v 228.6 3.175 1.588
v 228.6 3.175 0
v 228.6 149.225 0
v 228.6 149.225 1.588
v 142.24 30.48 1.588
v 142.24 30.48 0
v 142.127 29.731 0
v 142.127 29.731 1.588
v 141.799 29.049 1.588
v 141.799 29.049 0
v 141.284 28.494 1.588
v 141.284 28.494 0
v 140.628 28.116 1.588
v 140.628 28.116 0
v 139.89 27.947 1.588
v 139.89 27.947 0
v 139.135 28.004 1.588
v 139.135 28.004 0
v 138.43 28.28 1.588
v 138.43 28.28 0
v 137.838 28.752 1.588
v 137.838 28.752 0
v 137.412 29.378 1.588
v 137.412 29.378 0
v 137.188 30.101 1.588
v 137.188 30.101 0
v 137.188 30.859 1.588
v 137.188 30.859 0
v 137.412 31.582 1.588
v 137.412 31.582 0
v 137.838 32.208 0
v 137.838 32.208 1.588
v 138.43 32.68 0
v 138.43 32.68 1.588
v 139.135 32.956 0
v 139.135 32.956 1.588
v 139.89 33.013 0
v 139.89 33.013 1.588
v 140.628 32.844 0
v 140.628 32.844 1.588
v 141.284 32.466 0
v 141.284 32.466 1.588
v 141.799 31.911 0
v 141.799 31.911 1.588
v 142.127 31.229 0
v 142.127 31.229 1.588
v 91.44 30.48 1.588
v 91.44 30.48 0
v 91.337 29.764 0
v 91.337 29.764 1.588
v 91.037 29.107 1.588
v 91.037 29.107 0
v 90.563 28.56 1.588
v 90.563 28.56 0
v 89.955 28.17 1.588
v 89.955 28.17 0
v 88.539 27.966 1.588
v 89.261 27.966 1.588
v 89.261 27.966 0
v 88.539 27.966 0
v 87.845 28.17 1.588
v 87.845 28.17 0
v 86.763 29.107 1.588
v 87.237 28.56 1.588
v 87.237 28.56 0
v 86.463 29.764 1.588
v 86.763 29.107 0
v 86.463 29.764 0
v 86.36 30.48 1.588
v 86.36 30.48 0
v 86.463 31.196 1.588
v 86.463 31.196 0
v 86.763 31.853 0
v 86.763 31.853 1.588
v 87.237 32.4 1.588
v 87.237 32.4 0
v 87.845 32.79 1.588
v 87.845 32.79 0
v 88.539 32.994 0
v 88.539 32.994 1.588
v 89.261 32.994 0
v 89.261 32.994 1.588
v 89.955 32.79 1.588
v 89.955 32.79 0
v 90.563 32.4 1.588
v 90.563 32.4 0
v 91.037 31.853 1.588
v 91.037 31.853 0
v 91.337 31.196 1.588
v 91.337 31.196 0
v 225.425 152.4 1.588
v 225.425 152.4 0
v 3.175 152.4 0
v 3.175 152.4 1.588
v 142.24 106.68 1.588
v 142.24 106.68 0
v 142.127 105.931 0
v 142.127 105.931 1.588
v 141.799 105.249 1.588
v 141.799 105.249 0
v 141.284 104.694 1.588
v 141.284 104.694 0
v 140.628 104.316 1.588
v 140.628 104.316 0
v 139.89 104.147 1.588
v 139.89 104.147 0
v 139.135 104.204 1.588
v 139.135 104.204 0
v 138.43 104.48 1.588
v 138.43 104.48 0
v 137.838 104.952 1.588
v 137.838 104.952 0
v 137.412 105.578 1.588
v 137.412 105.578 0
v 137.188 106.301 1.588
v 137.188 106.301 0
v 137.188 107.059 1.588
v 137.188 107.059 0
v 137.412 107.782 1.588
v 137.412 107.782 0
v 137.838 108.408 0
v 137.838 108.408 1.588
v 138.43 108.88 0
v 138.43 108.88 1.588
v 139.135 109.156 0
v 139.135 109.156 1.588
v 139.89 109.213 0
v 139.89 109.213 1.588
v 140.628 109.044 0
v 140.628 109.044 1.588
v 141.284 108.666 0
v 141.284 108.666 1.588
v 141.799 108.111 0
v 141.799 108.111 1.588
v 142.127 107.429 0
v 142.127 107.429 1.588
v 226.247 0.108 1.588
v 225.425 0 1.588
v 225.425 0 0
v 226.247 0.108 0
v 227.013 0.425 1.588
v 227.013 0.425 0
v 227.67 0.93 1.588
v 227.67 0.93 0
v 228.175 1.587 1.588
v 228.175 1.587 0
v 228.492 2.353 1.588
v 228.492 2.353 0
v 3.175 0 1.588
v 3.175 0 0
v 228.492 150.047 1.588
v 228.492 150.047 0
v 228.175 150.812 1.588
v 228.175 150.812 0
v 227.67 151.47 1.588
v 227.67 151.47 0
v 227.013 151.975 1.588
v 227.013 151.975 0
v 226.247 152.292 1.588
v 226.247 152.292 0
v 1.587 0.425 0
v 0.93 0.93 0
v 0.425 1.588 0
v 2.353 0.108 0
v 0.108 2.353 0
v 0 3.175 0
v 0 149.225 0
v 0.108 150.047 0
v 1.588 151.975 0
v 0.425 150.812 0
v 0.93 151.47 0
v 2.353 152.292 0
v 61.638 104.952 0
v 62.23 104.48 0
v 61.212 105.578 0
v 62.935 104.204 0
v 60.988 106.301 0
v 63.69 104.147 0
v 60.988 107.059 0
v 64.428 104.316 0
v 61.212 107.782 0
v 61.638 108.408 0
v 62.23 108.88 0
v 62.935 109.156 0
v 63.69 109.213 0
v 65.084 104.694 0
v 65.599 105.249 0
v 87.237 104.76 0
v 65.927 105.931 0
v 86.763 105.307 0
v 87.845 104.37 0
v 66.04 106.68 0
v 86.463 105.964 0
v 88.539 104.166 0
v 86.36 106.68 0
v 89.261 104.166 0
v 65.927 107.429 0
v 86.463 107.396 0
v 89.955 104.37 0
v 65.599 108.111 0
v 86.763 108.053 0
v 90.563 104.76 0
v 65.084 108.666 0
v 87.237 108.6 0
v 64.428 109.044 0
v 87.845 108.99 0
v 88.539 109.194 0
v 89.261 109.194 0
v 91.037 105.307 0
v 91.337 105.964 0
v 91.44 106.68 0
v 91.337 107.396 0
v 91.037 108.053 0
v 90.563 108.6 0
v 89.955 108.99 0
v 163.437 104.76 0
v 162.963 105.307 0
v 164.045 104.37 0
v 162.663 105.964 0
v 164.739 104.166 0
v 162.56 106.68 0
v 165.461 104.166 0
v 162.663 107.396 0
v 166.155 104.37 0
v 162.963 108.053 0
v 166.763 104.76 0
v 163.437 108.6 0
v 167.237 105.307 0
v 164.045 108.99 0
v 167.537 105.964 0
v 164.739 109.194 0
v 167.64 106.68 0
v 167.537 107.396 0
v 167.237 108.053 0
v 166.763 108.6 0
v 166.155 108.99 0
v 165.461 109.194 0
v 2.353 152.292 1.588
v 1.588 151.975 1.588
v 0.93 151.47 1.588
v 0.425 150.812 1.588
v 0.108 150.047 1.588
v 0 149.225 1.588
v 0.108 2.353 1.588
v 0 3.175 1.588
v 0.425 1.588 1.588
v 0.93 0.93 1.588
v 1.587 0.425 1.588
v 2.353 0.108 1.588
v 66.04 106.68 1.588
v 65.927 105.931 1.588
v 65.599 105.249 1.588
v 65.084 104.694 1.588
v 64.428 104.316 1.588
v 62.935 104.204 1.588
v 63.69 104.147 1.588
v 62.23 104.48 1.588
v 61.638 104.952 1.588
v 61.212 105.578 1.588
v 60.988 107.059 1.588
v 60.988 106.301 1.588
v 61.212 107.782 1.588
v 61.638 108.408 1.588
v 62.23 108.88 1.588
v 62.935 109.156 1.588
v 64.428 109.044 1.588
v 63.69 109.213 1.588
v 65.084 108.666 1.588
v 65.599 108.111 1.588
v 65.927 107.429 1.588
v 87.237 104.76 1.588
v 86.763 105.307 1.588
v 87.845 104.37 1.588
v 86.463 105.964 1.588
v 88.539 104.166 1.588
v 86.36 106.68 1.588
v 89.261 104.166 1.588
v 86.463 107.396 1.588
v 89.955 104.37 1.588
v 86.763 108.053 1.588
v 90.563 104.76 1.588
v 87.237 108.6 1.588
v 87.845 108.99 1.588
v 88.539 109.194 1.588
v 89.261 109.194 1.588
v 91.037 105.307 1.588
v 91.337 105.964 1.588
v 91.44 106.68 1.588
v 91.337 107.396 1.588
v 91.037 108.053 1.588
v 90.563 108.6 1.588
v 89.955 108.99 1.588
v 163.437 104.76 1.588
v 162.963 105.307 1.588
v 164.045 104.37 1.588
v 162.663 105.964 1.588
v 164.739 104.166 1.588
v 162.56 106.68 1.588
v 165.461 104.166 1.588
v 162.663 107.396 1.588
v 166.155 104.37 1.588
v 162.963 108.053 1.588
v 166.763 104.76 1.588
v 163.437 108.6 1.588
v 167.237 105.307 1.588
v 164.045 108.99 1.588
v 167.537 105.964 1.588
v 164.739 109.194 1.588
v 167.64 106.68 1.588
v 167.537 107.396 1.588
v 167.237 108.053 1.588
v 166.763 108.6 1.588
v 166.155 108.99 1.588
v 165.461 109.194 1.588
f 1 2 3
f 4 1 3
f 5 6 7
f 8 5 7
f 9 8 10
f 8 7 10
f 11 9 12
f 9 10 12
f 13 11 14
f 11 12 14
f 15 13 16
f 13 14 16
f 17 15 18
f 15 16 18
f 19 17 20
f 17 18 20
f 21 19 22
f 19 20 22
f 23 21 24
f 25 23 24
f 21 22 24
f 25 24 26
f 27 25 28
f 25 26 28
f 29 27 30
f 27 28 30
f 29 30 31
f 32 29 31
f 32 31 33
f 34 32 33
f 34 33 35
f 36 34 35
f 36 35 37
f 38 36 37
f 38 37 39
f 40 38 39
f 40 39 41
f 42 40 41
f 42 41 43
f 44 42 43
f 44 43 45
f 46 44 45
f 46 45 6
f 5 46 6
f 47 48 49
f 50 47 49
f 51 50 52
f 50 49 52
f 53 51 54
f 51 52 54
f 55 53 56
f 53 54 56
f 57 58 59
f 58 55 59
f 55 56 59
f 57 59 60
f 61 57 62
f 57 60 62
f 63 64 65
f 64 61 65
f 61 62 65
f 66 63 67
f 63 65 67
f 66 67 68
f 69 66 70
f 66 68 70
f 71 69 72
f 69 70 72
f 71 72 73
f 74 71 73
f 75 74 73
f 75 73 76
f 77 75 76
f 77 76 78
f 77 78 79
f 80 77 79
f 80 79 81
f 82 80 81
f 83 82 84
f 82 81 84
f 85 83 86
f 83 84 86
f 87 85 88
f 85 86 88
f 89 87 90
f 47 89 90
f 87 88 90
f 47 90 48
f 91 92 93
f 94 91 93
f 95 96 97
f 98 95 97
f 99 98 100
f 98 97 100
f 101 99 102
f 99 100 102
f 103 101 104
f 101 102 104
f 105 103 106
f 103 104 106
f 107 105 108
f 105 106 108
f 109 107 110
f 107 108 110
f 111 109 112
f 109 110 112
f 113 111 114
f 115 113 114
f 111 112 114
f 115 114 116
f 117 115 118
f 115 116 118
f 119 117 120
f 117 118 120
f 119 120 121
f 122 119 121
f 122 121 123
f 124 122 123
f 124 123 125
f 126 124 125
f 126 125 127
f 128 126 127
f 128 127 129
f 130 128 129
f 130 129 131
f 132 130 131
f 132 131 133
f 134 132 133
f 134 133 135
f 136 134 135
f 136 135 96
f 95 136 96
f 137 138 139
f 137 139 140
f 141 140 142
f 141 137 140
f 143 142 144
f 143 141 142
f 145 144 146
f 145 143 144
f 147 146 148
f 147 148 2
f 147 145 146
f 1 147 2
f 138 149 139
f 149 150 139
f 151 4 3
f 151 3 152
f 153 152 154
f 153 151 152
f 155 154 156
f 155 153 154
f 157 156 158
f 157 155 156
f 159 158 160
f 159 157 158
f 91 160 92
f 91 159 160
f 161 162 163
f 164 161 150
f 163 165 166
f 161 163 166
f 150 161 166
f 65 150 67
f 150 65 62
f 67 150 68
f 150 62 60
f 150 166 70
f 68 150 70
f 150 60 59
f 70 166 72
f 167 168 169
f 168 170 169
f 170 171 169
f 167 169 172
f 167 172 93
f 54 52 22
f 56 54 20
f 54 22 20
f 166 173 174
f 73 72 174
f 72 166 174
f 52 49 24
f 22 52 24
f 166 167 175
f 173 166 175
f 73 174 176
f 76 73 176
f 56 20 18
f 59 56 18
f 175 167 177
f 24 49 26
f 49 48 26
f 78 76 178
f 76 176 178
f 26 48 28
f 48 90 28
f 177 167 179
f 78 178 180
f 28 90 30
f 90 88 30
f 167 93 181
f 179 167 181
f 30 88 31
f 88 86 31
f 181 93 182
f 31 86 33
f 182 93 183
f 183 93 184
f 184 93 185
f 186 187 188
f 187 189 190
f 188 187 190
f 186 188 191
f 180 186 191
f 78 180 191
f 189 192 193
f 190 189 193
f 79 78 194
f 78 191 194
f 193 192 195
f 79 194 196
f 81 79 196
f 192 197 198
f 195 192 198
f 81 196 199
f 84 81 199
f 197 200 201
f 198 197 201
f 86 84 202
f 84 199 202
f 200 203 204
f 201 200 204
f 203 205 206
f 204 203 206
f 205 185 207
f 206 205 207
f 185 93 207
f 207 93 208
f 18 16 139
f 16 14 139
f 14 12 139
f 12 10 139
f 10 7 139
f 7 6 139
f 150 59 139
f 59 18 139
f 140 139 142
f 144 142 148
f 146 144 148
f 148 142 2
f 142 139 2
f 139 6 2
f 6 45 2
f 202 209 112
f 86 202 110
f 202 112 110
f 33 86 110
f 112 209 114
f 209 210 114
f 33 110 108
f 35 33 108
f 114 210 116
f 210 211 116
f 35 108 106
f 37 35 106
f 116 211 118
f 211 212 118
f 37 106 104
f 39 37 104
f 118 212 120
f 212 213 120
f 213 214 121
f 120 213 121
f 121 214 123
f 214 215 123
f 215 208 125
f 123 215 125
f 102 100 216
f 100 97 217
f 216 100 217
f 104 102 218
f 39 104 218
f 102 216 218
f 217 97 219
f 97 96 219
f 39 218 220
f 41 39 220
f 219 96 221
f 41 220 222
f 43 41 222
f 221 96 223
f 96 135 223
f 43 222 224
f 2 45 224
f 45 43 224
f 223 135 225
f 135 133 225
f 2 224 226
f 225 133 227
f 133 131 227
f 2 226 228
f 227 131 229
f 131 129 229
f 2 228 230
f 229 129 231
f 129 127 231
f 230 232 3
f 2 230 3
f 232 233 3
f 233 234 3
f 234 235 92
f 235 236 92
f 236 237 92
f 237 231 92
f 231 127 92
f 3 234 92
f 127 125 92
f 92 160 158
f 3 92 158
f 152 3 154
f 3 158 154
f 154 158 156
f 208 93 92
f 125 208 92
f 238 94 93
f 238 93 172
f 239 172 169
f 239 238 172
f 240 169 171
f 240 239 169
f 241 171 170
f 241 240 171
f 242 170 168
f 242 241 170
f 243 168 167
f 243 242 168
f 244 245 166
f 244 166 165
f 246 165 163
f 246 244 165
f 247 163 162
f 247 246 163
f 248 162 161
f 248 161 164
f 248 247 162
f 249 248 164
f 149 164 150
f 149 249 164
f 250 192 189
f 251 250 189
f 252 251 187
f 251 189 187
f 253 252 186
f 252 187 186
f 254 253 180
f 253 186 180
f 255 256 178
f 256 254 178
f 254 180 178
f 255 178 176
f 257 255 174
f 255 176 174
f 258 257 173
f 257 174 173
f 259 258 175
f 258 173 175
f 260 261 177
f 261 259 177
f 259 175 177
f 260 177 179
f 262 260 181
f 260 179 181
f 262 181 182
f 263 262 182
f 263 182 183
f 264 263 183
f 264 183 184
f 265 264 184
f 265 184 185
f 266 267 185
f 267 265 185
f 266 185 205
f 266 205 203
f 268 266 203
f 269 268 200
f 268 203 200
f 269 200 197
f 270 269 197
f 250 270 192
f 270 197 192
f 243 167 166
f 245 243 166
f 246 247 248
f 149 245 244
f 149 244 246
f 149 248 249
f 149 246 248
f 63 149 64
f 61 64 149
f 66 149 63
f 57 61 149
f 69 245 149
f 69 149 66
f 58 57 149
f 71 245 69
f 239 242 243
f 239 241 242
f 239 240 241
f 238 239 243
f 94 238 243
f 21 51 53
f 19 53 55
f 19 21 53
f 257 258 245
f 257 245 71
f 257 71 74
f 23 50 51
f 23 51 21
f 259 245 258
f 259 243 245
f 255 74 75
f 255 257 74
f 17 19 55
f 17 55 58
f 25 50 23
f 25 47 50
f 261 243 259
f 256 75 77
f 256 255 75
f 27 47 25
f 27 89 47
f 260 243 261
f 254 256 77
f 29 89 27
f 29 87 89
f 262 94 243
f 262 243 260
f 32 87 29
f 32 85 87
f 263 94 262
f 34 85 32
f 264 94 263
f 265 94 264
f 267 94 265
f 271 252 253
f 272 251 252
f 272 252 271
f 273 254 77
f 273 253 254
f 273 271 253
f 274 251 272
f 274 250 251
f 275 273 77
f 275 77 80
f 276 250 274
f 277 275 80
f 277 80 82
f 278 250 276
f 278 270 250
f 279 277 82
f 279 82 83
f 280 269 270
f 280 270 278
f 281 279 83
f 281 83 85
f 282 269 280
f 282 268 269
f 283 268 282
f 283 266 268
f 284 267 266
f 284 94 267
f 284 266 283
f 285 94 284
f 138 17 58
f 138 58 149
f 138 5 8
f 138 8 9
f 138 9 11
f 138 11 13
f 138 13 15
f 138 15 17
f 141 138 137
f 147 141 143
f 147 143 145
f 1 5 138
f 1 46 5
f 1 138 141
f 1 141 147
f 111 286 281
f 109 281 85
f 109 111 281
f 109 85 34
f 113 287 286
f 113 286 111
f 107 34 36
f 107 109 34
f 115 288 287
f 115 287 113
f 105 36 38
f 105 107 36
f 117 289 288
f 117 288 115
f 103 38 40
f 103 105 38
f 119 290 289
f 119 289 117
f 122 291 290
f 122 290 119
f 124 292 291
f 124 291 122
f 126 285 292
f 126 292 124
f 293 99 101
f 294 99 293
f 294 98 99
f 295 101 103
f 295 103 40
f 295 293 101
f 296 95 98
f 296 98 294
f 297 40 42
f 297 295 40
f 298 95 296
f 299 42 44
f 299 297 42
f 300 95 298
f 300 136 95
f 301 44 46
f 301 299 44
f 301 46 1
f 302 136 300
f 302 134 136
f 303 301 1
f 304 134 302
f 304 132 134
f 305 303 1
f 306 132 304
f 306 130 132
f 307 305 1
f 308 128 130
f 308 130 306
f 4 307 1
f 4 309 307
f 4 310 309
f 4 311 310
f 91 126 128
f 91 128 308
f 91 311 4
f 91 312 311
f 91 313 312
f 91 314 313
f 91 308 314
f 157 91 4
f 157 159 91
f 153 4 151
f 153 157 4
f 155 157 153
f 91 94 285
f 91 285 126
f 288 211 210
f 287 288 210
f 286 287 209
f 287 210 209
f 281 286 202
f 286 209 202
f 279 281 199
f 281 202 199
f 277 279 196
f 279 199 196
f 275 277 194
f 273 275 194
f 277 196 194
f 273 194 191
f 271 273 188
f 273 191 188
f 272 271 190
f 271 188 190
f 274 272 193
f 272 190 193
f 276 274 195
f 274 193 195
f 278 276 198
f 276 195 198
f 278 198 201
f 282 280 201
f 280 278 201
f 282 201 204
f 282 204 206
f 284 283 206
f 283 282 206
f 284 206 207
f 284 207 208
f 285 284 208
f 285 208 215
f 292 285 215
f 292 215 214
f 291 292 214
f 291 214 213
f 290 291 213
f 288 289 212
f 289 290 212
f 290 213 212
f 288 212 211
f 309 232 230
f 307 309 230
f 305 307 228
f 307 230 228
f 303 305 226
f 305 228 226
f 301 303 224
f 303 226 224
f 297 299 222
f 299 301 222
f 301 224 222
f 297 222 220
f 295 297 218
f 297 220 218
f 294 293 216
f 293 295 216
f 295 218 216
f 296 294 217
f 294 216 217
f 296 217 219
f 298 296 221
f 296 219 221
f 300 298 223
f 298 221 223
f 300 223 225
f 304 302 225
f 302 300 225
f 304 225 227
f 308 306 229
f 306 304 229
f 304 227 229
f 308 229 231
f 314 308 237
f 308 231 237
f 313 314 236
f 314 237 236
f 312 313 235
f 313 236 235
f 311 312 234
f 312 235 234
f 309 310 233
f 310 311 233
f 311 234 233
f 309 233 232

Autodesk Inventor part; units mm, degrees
ref_plane "YZ Plane" through (0, 0, 0) normal (1, 0, 0) x (0, 1, 0)
ref_plane "XZ Plane" through (0, 0, 0) normal (0, 1, 0) x (-1, 0, 0)
ref_plane "XY Plane" through (0, 0, 0) normal (0, 0, 1) x (1, 0, 0)
sketch "Sketch1" plane through (0, 0, 0) normal (0, 0, 1) x (1, 0, 0)
  line L0 (0, 0) -> (228.6, 0)
  line L1 (228.6, 0) -> (228.6, 152.4)
  line L2 (228.6, 152.4) -> (0, 152.4)
  line L3 (0, 152.4) -> (0, 0)
  line L4 (0, 152.4) -> (50.8, 152.4)
  line L5 (50.8, 152.4) -> (50.8, 0)
  line L6 (228.6, 152.4) -> (177.8, 152.4)
  line L7 (177.8, 152.4) -> (177.8, 0)
  line L8 (50.8, 0) -> (50.8, 30.48)
  line L9 (50.8, 30.48) -> (88.9, 30.48)
  circle A0 centre (88.9, 30.48) radius 2.54
  line L10 (88.9, 30.48) -> (139.7, 30.48)
  circle A1 centre (139.7, 30.48) radius 2.54
  line L11 (139.7, 30.48) -> (139.7, 106.68)
  circle A2 centre (139.7, 106.68) radius 2.54
  line L12 (88.9, 30.48) -> (88.9, 106.68)
  circle A3 centre (88.9, 106.68) radius 2.54
  line L13 (88.9, 106.68) -> (139.7, 106.68)
  line L14 (139.7, 106.68) -> (165.1, 106.68)
  circle A4 centre (165.1, 106.68) radius 2.54
  line L15 (88.9, 106.68) -> (63.5, 106.68)
  circle A5 centre (63.5, 106.68) radius 2.54
  dimension "d0" = 228.6
  dimension "d1" = 152.4
  dimension "d2" = 50.8
  dimension "d3" = 50.8
  dimension "d4" = 30.48
  dimension "d5" = 38.1
  dimension "d6" = 5.08
  dimension "d7" = 50.8
  dimension "d8" = 5.08
  dimension "d9" = 76.2
  dimension "d10" = 5.08
  dimension "d11" = 5.08
  dimension "d12" = 25.4
  dimension "d13" = 5.08
  dimension "d14" = 25.4
  dimension "d15" = 5.08
extrude "Extrusion1" add sketch "Sketch1" along normal blind 1.5875 contours L3 L2 L5 L0 | L5 L2 L7 L0 | L7 L2 L1 L0 | L12 A3 L13 A2 L11 A1 L10 A0
fillet "Fillet1" radius 3.175 4 edges at (0, 152.4, 0.7937) (228.6, 152.4, 0.7937) (228.6, 0, 0.7937) (0, 0, 0.7937)
properties part number "Kicker poly"
